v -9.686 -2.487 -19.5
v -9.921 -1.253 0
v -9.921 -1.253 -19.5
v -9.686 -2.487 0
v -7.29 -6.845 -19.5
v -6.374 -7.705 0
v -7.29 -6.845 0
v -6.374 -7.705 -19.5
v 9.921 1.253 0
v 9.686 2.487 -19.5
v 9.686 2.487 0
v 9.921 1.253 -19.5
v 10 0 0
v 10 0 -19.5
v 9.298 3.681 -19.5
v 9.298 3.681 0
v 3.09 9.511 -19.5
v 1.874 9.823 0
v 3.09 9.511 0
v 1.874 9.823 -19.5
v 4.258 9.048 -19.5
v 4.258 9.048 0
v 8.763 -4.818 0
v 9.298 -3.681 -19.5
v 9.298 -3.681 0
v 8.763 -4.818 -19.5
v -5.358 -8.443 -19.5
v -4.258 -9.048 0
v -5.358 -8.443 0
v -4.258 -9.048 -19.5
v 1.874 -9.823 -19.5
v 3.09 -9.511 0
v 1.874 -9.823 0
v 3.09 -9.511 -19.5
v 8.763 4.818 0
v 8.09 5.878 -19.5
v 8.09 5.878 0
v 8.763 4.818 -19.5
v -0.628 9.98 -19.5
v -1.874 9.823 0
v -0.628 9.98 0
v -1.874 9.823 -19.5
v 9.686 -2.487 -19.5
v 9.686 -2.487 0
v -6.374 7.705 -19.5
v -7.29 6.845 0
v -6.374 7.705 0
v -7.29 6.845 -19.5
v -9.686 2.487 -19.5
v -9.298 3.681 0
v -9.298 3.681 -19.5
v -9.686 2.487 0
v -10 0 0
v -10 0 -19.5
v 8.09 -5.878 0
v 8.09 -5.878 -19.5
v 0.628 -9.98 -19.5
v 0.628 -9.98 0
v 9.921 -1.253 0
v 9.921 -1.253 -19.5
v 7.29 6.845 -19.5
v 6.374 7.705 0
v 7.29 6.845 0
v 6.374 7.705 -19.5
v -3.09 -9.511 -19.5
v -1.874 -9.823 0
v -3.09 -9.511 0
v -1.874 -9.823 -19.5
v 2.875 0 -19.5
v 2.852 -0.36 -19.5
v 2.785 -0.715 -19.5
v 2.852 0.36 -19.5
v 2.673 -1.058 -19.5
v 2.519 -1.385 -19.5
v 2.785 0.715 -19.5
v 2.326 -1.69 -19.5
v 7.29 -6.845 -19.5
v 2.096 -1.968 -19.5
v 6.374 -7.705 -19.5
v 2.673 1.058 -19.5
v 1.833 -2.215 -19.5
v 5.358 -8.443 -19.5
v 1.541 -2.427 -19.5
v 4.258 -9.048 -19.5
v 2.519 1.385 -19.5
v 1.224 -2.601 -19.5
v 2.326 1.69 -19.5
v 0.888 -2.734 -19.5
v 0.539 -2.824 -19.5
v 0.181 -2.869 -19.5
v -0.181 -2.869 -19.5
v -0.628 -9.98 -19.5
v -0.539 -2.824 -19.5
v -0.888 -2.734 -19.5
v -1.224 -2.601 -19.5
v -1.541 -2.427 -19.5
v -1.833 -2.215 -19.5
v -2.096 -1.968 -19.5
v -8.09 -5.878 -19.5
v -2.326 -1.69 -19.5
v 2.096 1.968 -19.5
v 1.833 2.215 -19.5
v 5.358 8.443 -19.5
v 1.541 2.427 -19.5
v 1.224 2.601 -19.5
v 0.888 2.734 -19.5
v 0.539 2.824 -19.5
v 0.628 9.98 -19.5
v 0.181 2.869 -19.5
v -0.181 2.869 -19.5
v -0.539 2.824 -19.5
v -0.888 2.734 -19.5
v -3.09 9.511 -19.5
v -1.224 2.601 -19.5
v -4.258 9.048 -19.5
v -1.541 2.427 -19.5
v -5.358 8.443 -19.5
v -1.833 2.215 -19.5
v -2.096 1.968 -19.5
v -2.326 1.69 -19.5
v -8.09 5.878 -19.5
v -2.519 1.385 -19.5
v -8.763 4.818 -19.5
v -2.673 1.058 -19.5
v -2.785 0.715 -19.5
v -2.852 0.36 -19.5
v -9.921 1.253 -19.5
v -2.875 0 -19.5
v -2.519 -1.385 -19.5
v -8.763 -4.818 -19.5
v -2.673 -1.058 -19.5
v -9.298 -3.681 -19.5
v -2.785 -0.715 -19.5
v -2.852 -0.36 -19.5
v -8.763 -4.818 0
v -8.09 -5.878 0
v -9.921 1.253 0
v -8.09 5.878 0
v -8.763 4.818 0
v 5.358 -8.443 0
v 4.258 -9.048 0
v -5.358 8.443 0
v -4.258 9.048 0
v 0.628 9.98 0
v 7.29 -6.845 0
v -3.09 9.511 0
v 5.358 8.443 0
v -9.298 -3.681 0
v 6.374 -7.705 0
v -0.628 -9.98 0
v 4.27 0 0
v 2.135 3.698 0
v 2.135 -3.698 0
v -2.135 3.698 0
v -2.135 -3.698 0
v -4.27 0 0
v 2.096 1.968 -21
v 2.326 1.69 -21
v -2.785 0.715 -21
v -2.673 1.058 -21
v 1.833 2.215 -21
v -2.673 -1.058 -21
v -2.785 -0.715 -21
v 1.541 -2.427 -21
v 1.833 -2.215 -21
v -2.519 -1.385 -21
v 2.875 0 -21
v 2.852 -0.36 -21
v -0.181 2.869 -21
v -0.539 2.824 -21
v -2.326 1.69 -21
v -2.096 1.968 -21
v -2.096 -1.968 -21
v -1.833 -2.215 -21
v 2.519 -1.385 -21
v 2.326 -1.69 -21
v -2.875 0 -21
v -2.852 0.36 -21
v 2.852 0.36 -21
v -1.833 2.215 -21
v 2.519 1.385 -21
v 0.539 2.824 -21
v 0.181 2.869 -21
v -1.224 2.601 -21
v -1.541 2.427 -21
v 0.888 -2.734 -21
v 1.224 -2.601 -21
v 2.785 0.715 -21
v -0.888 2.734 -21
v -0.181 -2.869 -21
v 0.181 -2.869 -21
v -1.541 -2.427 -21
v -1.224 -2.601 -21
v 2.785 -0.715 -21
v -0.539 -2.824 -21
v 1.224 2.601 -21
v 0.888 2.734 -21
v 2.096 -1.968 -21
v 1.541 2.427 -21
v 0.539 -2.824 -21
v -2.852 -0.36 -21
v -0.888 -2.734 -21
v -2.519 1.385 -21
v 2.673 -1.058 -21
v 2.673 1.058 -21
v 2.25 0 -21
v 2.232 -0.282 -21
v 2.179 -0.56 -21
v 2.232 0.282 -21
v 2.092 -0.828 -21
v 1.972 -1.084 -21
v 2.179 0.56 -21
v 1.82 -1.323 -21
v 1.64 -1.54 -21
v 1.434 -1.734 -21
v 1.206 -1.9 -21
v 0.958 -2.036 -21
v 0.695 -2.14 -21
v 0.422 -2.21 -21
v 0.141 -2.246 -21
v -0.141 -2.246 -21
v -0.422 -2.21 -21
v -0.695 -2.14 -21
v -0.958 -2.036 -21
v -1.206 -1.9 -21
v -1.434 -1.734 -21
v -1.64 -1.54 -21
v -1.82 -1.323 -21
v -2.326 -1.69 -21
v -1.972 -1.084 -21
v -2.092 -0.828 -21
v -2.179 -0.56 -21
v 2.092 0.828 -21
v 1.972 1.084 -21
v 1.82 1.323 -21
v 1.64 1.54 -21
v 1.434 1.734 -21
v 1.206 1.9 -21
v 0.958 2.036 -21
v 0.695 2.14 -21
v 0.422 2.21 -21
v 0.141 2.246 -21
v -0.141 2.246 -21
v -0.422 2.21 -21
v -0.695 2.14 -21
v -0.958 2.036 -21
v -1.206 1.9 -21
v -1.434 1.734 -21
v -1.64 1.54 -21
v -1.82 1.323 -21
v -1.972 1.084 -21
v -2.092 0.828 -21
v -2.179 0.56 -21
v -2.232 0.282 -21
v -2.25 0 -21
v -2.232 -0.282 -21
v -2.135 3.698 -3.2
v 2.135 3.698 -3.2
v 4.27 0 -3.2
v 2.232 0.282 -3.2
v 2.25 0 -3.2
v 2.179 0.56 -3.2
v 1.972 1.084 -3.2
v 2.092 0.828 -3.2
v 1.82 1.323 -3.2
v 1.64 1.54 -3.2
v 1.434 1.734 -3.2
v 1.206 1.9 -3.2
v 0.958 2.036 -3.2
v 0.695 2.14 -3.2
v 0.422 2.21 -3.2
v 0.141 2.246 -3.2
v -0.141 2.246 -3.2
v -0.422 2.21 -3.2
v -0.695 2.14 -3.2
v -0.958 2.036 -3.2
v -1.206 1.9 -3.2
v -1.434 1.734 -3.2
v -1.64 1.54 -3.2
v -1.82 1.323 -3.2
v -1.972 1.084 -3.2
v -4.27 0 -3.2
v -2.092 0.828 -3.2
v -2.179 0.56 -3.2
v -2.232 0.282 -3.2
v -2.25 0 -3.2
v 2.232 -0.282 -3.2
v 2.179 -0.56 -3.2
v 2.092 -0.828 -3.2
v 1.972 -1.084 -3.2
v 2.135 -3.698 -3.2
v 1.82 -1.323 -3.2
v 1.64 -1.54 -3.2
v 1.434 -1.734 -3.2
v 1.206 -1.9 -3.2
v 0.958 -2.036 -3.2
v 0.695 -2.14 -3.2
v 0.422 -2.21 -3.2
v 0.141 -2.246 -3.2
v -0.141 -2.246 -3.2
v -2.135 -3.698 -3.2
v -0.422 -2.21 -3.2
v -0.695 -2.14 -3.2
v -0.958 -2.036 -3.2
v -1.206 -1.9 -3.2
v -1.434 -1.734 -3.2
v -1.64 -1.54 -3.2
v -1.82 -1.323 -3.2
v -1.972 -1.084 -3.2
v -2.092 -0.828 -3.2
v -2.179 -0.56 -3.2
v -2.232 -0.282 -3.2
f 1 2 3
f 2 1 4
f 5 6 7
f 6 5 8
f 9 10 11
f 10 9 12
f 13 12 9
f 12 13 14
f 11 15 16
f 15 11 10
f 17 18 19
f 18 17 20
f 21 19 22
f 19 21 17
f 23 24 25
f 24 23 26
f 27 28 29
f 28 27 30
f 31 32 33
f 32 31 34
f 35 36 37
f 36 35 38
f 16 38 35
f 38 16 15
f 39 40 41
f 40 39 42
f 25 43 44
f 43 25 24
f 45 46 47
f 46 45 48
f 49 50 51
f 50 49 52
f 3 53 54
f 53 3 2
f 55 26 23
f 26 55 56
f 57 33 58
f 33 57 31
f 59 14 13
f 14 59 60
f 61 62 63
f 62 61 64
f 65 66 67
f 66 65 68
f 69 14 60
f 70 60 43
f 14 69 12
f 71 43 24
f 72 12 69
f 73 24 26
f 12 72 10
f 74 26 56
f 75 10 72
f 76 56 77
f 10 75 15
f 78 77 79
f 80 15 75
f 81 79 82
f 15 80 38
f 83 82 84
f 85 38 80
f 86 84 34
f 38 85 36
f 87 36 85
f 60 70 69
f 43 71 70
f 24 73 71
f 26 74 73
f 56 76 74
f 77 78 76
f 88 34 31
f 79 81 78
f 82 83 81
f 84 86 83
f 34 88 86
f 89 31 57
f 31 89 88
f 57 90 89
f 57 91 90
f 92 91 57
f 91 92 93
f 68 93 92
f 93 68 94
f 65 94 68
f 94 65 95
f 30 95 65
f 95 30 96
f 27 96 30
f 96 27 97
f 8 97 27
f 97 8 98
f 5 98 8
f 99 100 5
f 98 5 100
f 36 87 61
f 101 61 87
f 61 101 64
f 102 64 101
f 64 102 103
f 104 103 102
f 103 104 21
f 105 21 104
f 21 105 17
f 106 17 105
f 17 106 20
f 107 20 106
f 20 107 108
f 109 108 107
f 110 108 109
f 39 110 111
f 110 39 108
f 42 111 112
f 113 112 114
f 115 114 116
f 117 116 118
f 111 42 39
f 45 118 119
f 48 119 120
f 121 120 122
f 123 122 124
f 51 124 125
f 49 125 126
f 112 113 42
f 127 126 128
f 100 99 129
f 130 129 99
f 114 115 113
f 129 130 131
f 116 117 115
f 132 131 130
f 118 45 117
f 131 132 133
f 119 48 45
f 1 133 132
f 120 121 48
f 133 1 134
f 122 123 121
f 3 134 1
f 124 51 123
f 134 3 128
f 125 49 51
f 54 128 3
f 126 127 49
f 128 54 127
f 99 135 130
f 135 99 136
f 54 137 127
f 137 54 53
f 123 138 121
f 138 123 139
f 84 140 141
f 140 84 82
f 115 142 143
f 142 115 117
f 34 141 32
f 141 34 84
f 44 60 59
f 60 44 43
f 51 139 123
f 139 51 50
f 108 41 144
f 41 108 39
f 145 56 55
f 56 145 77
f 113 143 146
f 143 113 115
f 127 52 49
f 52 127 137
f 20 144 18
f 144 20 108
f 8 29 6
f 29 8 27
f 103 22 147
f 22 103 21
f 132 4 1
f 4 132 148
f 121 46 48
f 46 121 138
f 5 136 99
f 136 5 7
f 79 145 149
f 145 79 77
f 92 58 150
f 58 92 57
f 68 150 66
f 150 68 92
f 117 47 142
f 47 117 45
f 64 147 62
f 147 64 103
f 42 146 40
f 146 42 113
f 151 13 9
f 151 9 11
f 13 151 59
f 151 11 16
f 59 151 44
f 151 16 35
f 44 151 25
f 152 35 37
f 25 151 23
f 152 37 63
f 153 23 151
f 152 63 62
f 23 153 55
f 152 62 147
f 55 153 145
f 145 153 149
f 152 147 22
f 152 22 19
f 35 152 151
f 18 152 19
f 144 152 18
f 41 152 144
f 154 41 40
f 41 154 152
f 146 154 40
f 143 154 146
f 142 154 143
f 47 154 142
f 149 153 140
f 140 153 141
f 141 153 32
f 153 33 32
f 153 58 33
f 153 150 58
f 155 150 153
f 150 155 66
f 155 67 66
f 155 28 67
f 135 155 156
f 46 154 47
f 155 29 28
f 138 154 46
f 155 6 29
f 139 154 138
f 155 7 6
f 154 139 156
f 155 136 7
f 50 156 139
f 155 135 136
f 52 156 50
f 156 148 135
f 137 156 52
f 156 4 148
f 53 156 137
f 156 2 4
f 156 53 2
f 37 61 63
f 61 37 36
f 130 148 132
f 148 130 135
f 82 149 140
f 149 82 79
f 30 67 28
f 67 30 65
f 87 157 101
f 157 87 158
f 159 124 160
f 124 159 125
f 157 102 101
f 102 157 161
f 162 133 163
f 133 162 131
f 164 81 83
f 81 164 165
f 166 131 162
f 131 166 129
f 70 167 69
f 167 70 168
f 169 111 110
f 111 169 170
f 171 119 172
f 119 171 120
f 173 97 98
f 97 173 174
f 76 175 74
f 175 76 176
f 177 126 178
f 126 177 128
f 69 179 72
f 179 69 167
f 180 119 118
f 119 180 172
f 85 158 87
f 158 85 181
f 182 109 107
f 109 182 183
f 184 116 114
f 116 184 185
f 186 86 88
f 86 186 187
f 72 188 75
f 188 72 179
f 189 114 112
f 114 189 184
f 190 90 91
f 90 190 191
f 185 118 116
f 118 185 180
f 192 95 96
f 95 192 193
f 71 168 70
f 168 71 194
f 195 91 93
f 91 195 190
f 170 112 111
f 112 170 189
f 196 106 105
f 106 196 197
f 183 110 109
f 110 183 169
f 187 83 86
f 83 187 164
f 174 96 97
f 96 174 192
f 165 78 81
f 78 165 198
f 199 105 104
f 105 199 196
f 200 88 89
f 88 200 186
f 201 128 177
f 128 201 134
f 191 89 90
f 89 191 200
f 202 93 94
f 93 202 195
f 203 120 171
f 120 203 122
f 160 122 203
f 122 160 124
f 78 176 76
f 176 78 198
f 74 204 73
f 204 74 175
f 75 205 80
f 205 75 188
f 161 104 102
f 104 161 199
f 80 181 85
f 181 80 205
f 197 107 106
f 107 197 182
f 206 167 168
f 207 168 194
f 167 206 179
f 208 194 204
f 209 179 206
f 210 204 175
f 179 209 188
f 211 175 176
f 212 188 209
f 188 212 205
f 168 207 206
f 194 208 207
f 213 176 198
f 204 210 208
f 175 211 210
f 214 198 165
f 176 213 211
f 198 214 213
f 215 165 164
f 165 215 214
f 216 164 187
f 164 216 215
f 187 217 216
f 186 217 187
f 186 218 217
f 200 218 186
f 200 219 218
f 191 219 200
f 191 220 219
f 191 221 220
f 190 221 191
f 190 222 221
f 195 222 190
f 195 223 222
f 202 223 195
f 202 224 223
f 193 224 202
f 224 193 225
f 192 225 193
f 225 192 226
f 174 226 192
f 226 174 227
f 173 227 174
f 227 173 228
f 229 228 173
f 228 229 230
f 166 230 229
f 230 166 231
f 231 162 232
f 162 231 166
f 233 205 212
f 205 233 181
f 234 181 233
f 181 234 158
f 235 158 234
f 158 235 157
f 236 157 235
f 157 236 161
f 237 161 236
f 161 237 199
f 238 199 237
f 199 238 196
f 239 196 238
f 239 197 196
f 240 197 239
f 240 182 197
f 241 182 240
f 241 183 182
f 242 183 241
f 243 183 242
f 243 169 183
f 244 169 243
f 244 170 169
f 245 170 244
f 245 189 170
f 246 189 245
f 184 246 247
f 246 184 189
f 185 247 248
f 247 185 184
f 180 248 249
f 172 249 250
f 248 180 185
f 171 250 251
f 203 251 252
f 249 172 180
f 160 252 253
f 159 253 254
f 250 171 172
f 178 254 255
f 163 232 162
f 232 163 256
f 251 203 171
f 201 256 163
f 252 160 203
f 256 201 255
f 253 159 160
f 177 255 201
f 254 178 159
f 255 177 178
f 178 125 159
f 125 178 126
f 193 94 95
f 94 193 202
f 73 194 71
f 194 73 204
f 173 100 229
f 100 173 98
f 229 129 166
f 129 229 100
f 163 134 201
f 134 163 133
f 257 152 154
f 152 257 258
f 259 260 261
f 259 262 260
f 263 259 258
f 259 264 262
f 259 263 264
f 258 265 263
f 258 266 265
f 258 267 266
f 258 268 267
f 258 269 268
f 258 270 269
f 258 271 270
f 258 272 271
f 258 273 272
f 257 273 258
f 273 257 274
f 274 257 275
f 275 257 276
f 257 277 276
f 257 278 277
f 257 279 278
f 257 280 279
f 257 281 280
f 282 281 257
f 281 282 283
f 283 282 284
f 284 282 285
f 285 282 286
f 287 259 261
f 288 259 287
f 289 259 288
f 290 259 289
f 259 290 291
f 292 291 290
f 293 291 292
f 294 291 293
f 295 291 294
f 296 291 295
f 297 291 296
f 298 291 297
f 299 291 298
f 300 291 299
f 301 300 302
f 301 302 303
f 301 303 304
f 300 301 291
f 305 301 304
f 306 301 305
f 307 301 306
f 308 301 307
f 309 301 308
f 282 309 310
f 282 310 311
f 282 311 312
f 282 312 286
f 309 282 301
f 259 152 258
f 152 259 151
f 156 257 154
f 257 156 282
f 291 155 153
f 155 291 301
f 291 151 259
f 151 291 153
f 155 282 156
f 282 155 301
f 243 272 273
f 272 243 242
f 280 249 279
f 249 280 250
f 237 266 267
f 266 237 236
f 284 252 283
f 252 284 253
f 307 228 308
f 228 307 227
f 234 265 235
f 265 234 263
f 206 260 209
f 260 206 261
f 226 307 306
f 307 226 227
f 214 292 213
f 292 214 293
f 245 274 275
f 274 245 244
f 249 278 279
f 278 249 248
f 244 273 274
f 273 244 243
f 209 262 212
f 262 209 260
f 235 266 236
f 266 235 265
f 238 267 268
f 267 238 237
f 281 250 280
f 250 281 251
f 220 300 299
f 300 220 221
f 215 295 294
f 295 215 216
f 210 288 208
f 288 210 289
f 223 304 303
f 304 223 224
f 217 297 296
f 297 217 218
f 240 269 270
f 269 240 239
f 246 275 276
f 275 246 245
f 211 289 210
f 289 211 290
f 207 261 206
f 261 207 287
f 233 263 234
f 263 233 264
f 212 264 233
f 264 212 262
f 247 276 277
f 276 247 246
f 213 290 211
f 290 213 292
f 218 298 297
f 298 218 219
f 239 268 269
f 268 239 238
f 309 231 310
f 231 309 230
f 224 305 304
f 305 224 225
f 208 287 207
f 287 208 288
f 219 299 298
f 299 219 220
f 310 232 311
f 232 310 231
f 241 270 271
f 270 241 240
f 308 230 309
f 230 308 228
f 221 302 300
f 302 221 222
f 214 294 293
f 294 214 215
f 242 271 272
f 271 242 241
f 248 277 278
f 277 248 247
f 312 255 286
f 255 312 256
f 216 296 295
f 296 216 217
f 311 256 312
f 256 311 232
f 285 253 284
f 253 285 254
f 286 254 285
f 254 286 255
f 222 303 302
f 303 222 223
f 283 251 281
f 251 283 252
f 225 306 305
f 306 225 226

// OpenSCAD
$fn = 50;

difference() {
	union() {
		translate(v = [0, 0, -19.5]) {
			cylinder(h = 19.5, r = 10.0);
		}
		#translate(v = [0, 0, -21.0]) {
			cylinder(h = 21, r = 2.875);
		}
	}
	union() {
		translate(v = [0, 0, 0]) {
			rotate(a = [0, 0, 0]) {
				difference() {
					union() {
						translate(v = [0, 0, -3.2]) {
							linear_extrude(height = 3.2) {
								polygon(points = [[4.2698, 0.0], [2.1349000000000005, 3.697755269078796], [-2.134899999999999, 3.6977552690787965], [-4.2698, 5.228996902999369e-16], [-2.134900000000002, -3.6977552690787956], [2.1348999999999974, -3.697755269078798]]);
							}
						}
					}
					union();
				}
			}
		}
		#translate(v = [0, 0, -100.0]) {
			cylinder(h = 200, r = 2.25);
		}
	}
}
